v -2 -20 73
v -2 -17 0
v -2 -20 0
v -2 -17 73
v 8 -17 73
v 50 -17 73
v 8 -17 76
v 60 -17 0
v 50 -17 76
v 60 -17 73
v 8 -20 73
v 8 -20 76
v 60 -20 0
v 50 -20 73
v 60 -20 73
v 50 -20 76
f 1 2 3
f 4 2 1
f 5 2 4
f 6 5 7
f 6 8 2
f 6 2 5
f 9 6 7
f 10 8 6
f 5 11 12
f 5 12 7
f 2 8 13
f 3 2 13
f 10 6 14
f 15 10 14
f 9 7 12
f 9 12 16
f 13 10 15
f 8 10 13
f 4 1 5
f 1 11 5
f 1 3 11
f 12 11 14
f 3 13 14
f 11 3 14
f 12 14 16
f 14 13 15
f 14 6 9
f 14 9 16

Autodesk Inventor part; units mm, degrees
ref_plane "YZ Plane" through (0, 0, 0) normal (1, 0, 0) x (0, 1, 0)
ref_plane "XZ Plane" through (0, 0, 0) normal (0, 1, 0) x (-1, 0, 0)
ref_plane "XY Plane" through (0, 0, 0) normal (0, 0, 1) x (1, 0, 0)
sketch "Sketch1" plane through (0, 0, 0) normal (0, 0, 1) x (1, 0, 0)
  line L0 (50, -20) -> (8, -20) projected
  line L1 (8, -17) -> (50, -17) projected
  line L2 (50, -17) -> (50, -20) projected
  line L3 (8, -20) -> (8, -17) projected
  line L4 (50, -17) -> (8, -17)
  line L5 (8, -17) -> (8, -20)
  line L6 (8, -20) -> (50, -20)
  line L7 (50, -20) -> (50, -17)
  point P0 (0, 0)
extrude "Extrusion1" add sketch "Sketch1" along normal blind 76
sketch "Sketch2" plane through (50, -20, 0) normal (1, 0, 0) x (0, 0, -1)
  line L0 (-73, 6.5) -> (-73, 16.5) projected
  line L1 (0, 3) -> (-76, 3) projected
  line L2 (0, 0) -> (0, 3) projected
  line L3 (0, 0) -> (-76, 0) projected
  line L4 (-73, 0) -> (0, 0)
  line L5 (0, 0) -> (0, 3)
  line L6 (0, 3) -> (-73, 3)
  line L7 (-73, 3) -> (-73, 0)
  point P0 (0, 20)
  point P1 (-69, 3)
  point P2 (-69, 1.5)
  point P3 (-73, 3)
extrude "Extrusion2" add sketch "Sketch2" along normal blind 10
sketch "Sketch3" plane through (8, -20, 0) normal (-1, 0, 0) x (0, 0, 1)
  line L0 (73, 6.5) -> (73, 16.5) projected
  line L1 (0, 3) -> (0, 0) projected
  line L2 (0, 3) -> (76, 3) projected
  line L3 (73, 3) -> (0, 3)
  line L4 (0, 3) -> (0, 0)
  line L5 (0, 0) -> (73, 0)
  line L6 (73, 0) -> (73, 3)
  point P0 (0, 20)
  point P1 (69, 0)
  point P2 (69, 1.5)
extrude "Extrusion3" add sketch "Sketch3" along normal blind 10
properties part number "divider 2"
